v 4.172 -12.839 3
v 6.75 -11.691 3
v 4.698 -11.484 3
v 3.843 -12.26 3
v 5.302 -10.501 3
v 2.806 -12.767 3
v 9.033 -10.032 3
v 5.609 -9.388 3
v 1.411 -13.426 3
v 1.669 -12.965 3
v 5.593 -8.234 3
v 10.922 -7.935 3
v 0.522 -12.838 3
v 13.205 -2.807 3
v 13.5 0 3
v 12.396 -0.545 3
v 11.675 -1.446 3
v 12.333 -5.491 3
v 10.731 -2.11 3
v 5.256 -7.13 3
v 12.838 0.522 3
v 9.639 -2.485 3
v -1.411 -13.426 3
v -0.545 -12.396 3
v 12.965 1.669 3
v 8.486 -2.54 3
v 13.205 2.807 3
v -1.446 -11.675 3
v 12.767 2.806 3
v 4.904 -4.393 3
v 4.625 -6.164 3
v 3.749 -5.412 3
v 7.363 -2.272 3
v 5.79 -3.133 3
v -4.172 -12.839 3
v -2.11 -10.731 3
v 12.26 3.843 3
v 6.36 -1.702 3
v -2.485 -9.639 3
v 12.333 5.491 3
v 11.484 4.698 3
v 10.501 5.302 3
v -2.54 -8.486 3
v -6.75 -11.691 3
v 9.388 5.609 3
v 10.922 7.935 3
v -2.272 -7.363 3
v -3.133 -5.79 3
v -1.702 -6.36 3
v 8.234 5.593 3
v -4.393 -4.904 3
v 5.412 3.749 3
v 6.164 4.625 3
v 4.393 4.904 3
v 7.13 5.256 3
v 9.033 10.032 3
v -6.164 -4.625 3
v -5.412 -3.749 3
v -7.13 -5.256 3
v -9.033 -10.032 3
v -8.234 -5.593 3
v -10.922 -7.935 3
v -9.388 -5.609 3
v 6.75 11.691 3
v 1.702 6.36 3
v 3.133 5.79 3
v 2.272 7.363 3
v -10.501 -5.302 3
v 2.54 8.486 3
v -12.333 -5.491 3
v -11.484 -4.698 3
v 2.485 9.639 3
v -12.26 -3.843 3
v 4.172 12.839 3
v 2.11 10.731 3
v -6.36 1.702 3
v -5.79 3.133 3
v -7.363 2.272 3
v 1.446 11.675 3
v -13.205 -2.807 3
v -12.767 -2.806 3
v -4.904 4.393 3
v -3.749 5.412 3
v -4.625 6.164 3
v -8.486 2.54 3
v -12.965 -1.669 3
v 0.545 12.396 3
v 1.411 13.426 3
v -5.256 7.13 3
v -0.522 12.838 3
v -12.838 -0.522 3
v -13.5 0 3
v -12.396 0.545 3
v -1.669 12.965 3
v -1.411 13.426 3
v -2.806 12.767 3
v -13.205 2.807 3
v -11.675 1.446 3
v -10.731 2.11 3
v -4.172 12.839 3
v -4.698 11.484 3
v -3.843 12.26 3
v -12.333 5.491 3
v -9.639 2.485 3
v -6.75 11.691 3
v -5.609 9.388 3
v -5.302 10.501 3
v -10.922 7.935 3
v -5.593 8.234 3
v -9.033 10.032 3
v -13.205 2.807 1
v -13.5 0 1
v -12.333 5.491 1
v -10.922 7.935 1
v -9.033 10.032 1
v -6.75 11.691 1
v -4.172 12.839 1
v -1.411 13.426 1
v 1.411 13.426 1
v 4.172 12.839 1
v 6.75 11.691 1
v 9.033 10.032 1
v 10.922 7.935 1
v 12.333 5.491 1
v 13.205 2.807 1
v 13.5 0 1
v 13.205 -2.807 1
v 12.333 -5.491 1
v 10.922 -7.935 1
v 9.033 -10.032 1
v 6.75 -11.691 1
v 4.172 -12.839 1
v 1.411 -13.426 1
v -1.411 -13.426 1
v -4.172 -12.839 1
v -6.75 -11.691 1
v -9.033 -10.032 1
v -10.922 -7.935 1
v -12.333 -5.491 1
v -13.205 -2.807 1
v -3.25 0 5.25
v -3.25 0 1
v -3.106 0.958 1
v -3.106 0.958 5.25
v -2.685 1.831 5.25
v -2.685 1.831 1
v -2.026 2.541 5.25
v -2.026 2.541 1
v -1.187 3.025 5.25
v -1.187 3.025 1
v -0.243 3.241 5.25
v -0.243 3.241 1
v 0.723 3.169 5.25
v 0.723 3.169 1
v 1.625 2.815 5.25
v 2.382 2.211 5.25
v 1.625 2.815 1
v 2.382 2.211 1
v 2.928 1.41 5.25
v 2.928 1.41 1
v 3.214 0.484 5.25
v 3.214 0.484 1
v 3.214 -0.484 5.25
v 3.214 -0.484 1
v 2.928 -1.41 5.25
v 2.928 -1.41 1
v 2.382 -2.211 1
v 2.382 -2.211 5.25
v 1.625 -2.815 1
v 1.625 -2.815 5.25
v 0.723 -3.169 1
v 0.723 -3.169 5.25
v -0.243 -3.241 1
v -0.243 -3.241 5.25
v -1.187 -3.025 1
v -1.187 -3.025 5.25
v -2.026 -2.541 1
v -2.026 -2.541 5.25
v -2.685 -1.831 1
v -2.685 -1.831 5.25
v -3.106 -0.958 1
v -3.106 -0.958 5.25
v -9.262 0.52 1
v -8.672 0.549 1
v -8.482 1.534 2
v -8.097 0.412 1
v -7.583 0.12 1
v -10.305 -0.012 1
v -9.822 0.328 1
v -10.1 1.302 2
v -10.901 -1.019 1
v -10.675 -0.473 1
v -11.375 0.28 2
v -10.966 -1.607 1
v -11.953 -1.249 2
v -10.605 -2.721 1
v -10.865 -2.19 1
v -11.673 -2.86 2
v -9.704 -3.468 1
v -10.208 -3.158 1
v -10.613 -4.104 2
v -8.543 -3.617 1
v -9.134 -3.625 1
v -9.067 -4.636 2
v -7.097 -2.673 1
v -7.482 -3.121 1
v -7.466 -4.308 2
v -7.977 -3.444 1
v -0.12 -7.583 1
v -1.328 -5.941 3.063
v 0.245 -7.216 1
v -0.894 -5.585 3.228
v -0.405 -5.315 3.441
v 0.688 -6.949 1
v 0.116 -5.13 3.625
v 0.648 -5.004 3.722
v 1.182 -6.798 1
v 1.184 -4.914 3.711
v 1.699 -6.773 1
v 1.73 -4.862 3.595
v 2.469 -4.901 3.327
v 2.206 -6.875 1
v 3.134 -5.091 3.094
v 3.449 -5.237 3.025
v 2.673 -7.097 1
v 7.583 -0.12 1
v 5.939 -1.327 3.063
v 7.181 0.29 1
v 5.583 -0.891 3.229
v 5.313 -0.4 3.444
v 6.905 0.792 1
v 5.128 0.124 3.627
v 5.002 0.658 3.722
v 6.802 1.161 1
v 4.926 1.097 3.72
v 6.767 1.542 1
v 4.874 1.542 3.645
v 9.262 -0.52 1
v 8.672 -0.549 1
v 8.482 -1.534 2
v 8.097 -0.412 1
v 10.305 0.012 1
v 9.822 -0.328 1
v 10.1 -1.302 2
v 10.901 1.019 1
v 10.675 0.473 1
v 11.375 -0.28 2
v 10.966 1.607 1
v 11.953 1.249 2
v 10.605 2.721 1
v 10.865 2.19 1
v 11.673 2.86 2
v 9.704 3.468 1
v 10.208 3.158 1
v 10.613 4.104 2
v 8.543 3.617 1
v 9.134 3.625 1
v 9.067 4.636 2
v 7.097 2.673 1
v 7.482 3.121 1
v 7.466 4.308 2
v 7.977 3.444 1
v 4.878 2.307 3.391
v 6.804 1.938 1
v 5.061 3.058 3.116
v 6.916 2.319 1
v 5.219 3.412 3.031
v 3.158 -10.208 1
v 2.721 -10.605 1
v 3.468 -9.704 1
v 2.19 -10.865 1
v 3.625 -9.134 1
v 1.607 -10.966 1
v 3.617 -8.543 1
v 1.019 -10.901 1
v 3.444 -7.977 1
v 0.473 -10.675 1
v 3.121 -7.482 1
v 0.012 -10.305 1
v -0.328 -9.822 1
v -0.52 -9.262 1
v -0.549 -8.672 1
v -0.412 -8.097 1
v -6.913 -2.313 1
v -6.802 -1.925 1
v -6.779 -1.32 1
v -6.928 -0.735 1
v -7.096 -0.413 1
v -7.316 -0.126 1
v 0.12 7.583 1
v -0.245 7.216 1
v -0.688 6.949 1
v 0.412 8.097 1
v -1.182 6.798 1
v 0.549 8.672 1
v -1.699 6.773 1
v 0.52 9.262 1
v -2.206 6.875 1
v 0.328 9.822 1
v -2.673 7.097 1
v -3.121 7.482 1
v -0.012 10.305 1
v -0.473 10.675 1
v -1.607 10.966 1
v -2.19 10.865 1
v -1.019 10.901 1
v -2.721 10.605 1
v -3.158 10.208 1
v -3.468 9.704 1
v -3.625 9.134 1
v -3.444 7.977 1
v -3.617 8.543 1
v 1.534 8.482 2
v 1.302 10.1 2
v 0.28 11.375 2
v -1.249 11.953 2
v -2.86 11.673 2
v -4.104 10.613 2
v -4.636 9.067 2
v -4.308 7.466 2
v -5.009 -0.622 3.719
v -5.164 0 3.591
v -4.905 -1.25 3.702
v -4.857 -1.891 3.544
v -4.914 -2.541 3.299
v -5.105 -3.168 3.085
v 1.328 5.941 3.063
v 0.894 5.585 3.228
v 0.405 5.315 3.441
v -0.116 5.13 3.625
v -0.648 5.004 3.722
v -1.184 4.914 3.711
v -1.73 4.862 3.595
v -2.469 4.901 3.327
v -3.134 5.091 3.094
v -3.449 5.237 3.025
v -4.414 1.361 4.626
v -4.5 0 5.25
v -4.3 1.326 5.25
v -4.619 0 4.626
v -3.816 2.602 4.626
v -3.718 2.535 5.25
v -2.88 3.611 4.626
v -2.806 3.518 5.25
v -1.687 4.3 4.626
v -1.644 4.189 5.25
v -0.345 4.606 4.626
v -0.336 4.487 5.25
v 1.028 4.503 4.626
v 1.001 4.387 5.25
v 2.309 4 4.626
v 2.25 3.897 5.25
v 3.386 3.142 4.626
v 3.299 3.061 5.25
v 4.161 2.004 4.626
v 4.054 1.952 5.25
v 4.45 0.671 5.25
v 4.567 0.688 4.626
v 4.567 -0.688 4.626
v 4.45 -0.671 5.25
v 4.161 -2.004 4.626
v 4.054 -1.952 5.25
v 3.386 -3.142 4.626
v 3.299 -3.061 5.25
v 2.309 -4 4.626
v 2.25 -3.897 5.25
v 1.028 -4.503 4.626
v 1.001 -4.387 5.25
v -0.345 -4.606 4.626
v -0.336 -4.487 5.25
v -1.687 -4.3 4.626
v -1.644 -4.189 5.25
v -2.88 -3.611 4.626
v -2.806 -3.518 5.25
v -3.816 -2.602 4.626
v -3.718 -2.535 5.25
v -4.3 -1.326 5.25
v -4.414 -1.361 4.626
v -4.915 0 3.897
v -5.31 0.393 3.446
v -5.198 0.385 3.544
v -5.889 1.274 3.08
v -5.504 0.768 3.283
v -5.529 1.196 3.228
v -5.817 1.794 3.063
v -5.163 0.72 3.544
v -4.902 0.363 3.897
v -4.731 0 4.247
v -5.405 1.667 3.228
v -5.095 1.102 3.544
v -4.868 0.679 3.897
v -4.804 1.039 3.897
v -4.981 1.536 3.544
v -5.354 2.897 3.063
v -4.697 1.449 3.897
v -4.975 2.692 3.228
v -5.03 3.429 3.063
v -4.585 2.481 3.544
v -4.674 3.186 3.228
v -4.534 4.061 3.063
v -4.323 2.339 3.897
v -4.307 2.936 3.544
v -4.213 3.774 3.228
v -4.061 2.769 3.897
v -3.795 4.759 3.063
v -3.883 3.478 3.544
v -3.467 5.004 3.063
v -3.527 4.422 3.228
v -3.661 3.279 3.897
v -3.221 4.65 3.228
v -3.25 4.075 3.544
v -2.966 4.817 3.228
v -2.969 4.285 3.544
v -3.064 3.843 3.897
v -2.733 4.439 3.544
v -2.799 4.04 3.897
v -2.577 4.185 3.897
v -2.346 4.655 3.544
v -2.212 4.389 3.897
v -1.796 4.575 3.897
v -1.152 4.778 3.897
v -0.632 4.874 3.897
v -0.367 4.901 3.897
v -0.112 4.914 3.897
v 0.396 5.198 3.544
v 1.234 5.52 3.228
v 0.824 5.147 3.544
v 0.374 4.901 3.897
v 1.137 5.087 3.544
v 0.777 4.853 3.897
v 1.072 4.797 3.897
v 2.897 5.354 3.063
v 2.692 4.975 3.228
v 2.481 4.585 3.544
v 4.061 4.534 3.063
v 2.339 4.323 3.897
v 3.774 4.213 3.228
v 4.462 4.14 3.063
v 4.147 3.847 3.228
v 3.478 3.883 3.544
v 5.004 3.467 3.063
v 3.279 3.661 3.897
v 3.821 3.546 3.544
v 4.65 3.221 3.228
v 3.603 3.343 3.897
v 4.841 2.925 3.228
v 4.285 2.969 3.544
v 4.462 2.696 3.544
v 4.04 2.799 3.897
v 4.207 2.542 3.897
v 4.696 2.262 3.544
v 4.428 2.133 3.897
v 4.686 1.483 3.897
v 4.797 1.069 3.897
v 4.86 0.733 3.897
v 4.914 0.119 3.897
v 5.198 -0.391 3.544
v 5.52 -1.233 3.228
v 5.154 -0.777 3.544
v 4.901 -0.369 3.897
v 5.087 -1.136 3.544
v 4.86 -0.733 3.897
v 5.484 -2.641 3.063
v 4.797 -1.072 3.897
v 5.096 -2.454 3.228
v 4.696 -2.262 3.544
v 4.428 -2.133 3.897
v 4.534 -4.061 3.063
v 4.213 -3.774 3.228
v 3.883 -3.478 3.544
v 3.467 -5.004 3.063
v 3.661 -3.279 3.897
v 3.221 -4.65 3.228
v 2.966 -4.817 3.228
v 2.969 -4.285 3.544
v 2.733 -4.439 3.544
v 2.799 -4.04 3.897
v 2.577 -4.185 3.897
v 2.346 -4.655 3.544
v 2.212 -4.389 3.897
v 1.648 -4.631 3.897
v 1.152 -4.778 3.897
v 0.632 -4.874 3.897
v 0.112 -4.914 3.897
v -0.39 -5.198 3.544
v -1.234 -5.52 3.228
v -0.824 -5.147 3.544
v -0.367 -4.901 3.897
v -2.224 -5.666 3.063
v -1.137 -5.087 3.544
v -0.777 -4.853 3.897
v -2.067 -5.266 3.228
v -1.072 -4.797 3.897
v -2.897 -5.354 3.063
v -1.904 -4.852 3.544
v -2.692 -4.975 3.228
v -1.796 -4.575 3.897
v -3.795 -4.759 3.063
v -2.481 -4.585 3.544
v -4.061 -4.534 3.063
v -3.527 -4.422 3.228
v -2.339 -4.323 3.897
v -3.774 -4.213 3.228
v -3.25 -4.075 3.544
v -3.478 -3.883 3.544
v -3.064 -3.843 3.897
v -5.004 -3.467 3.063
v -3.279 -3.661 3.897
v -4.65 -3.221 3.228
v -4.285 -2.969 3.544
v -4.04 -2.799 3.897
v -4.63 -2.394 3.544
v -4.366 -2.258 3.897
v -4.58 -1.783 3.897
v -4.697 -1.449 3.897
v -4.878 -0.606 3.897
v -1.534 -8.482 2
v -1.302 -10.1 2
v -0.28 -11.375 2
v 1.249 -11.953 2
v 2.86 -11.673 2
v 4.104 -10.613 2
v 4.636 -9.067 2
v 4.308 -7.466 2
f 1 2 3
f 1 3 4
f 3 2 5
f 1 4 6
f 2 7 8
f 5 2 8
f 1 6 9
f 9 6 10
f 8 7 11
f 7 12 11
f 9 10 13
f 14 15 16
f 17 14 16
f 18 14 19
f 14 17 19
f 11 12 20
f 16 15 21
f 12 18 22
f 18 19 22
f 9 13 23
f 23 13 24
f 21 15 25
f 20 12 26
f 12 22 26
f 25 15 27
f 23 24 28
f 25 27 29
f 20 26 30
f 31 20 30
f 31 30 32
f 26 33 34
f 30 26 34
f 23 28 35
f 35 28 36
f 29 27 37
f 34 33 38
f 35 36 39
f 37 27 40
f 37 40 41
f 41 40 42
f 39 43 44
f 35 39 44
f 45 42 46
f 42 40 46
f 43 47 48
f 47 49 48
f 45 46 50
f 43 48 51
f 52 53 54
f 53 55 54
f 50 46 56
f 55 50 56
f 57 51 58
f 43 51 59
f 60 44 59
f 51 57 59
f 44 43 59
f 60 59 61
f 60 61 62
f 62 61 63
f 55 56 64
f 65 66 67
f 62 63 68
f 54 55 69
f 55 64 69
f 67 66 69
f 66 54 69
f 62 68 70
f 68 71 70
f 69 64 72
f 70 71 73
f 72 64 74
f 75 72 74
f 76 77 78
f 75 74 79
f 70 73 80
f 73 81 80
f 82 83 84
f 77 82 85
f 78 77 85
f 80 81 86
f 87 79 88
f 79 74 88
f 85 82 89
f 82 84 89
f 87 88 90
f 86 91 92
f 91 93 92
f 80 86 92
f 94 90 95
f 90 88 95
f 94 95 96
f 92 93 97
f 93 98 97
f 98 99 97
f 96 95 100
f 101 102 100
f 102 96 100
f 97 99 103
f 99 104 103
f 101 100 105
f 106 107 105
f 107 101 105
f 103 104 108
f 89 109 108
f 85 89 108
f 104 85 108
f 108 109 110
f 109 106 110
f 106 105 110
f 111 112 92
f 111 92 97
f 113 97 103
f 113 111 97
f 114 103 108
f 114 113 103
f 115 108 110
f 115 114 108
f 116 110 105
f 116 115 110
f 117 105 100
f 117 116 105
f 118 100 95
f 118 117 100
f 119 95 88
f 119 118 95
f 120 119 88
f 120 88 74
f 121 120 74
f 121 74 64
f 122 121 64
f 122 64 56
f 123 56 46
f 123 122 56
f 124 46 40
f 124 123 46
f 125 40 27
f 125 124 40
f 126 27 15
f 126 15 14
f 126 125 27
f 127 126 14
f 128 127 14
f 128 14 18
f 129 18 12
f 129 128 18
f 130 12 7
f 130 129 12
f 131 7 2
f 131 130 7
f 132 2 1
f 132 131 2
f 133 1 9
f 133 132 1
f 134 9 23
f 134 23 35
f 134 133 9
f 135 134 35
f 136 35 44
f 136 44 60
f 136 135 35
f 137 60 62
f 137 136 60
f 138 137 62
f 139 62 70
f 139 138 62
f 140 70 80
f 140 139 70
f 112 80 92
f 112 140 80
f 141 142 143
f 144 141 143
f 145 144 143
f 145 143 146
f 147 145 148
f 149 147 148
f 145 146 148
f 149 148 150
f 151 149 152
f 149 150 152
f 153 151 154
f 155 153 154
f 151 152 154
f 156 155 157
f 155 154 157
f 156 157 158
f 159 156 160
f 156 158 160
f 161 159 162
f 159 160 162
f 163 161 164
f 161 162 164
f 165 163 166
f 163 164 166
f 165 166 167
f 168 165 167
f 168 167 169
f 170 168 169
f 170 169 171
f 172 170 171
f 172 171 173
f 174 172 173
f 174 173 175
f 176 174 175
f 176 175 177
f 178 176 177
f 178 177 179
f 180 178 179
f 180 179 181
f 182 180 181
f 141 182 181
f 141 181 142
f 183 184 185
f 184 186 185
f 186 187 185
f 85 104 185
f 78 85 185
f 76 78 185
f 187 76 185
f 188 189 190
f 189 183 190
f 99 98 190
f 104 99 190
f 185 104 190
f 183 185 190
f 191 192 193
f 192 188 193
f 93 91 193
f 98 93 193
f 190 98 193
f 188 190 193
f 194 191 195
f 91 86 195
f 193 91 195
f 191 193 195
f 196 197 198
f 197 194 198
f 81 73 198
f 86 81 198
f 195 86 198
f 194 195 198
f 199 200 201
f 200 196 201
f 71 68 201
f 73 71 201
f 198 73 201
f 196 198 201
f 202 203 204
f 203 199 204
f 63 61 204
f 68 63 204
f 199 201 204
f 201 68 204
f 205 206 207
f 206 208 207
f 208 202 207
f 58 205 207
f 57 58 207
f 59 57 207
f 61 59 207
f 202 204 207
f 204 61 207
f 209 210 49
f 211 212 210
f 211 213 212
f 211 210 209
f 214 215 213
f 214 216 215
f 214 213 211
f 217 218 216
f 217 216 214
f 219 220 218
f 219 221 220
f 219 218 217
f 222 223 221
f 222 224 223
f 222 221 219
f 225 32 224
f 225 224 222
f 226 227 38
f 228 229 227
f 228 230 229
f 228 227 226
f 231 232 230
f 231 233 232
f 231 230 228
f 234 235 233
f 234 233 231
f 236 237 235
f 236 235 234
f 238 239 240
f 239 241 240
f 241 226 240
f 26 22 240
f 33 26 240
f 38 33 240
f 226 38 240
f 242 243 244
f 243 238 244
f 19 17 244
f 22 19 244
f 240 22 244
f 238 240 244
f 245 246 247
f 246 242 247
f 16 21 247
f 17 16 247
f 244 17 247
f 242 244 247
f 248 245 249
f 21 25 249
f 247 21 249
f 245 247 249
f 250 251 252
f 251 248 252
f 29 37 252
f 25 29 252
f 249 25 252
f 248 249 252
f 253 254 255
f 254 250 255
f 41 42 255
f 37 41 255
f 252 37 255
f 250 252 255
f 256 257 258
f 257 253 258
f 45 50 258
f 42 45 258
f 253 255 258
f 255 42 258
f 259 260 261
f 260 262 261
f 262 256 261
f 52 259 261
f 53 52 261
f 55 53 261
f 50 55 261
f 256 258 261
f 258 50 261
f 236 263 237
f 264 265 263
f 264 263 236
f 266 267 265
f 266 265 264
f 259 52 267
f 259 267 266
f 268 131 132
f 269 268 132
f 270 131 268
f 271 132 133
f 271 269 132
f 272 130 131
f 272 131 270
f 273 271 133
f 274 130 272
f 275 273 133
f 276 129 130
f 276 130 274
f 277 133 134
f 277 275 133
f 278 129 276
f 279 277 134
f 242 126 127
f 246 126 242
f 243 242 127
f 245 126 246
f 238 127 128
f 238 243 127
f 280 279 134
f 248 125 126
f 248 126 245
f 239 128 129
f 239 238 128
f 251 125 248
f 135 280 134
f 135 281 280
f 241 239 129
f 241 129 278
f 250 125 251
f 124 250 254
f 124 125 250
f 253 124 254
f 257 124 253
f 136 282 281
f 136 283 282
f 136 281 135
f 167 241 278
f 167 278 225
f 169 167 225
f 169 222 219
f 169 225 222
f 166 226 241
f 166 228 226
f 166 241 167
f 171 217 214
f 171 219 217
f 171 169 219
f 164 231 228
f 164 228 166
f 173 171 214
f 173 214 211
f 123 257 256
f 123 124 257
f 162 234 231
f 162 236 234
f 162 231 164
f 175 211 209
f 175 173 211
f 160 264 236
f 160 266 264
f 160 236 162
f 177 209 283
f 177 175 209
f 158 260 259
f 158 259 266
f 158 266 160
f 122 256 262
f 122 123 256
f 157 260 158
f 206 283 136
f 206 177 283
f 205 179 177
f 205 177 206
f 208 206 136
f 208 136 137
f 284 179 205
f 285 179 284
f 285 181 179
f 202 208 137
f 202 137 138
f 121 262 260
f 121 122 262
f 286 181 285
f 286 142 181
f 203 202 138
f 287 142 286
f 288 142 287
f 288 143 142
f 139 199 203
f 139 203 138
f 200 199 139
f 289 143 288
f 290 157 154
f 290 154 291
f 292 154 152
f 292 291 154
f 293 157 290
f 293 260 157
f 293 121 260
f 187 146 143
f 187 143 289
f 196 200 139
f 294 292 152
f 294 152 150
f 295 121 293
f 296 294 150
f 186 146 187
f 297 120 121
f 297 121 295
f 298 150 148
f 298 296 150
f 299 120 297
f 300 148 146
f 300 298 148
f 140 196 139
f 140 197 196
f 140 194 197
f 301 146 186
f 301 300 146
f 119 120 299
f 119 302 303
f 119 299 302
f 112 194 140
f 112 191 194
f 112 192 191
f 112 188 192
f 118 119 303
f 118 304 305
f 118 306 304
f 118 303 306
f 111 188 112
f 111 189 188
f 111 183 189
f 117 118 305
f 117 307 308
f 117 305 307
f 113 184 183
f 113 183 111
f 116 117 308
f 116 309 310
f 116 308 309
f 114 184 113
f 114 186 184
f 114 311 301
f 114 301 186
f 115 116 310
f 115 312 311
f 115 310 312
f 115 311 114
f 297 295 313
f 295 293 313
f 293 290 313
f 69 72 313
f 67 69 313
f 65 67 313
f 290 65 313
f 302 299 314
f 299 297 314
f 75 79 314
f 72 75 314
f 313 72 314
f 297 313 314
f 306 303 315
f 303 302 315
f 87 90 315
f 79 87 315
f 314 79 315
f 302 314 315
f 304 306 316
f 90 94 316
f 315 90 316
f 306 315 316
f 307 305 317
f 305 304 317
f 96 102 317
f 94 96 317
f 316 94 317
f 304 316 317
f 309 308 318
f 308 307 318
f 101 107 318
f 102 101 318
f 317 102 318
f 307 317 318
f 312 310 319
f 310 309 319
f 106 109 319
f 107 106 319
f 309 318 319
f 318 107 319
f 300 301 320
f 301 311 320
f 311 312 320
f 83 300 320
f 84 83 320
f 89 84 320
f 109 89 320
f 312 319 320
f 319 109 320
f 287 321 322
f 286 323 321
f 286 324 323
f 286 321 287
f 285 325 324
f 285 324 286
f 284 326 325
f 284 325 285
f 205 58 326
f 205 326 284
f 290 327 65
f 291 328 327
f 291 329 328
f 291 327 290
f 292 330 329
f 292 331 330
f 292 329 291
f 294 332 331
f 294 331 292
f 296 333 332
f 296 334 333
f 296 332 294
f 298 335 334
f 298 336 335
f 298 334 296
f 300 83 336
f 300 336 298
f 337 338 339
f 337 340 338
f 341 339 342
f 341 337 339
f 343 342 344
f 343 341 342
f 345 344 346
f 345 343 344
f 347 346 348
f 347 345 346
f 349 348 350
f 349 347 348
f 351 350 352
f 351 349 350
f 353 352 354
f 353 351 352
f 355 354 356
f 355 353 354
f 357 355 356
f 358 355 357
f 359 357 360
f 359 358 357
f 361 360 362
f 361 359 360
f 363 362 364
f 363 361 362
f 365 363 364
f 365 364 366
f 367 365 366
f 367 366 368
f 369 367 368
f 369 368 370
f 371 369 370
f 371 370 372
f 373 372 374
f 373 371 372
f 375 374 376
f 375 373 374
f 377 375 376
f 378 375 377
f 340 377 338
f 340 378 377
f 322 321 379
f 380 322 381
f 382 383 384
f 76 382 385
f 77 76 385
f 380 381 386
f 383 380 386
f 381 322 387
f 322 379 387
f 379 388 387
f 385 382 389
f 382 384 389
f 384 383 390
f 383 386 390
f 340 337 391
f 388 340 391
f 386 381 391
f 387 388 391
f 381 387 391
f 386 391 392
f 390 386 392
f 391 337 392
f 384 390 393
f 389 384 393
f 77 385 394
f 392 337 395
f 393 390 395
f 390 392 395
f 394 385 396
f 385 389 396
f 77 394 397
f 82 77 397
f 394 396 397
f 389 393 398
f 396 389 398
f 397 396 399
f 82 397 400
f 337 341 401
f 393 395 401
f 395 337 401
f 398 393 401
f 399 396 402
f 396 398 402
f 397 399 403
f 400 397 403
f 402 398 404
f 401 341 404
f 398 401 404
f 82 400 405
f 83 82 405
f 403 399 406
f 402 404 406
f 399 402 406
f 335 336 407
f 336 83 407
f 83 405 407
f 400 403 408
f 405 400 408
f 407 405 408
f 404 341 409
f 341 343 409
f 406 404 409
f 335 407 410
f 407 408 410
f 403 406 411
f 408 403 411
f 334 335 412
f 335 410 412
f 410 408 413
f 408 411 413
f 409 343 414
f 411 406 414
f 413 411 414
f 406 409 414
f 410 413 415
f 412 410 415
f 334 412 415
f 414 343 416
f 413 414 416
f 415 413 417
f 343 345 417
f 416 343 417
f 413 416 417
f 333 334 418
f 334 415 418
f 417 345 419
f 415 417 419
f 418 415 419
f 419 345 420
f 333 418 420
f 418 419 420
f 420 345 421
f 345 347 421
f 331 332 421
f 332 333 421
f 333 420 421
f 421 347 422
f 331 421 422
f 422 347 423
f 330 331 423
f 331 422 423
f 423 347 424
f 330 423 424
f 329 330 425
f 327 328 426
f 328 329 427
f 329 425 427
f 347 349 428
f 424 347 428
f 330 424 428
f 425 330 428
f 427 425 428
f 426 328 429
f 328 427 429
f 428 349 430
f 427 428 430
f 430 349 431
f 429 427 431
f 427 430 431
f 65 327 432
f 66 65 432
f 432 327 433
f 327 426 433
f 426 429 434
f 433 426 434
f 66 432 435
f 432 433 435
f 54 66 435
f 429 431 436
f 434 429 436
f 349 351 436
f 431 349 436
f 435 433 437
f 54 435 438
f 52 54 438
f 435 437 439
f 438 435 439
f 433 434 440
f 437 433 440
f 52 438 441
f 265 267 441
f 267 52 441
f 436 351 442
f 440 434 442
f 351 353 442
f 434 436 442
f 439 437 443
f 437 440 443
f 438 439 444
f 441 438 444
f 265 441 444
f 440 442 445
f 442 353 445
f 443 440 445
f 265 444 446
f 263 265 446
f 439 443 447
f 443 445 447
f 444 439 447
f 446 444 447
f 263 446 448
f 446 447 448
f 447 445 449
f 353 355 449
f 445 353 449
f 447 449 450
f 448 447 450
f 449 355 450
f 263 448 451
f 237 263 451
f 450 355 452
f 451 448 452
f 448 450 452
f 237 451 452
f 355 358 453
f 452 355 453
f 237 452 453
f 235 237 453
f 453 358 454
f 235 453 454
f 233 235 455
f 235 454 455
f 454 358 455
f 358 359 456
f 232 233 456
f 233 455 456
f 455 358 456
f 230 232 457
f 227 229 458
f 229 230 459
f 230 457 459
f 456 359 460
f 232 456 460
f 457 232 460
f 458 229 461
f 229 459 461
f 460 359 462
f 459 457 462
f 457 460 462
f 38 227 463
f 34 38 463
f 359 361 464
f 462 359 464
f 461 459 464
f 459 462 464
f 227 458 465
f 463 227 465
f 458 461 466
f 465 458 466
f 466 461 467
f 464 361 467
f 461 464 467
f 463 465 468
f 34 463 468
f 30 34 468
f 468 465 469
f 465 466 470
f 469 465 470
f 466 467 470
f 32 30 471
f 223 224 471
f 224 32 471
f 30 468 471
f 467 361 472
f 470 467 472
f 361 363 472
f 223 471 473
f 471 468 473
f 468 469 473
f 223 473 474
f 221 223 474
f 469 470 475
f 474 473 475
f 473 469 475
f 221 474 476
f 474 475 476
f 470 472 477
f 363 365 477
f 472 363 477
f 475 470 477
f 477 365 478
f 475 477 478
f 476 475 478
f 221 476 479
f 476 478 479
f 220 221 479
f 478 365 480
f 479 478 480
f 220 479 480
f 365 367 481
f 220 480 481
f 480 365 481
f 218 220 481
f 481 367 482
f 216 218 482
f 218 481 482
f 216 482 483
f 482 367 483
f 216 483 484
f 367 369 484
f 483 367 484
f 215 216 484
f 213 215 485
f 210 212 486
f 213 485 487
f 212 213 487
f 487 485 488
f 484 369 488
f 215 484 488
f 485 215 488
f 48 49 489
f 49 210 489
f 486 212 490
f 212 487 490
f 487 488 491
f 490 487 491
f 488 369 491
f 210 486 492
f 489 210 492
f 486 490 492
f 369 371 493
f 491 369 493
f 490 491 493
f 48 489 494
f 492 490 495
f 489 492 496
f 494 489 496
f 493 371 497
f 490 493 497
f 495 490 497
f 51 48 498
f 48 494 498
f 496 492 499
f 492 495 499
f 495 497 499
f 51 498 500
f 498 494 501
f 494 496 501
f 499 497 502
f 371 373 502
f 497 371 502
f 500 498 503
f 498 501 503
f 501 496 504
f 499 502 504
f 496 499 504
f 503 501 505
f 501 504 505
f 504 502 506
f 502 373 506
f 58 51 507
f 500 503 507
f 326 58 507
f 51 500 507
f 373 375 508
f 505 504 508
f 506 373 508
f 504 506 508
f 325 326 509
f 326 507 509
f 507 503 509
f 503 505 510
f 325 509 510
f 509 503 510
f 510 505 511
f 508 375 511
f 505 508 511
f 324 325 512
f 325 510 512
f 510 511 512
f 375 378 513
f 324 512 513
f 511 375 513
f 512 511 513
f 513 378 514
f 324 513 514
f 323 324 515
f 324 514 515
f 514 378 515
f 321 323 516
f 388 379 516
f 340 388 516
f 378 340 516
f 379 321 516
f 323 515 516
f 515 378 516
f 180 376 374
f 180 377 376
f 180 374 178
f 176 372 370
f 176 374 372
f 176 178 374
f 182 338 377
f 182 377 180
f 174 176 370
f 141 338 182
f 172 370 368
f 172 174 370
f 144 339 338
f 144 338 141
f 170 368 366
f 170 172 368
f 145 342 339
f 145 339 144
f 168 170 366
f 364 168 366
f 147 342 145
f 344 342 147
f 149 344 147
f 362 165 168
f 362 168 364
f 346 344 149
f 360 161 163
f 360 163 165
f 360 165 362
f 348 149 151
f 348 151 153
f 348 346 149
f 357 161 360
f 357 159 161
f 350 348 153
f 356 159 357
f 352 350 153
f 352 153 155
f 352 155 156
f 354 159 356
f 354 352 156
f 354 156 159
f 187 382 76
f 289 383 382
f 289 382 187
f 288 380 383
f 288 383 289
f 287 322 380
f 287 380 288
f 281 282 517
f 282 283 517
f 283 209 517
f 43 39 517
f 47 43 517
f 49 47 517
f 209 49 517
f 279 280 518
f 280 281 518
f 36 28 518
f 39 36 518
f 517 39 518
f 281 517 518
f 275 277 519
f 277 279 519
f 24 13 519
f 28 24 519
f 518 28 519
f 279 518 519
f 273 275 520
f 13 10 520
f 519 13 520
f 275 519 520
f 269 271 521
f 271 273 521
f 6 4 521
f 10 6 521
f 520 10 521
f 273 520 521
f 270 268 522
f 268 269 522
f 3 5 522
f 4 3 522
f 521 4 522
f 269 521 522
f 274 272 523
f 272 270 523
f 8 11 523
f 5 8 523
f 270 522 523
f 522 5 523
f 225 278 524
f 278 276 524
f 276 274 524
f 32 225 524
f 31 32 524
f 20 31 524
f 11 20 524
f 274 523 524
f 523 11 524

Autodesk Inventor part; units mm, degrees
ref_plane "YZ Plane" through (0, 0, 0) normal (1, 0, 0) x (0, 1, 0)
ref_plane "XZ Plane" through (0, 0, 0) normal (0, 1, 0) x (-1, 0, 0)
ref_plane "XY Plane" through (0, 0, 0) normal (0, 0, 1) x (1, 0, 0)
sketch "Эскиз1" plane through (0, 0, 0) normal (0, 0, 1) x (1, 0, 0)
  circle A0 centre (0, 0) radius 3.25
  circle A1 centre (0, 0) radius 4.5
  dimension "d0" = 6.5
  dimension "d1" = 9
extrude "Выдавливание1" add sketch "Эскиз1" along normal blind 5.25
sketch "Эскиз2" plane through (0, 0, 0) normal (0, 0, -1) x (-1, 0, 0)
  circle A0 centre (0, 0) radius 5.5
  dimension "d4" = 11
loft "Лофт1" add profiles "Эскиз2" section 2 edges at (-4.5, 0, 5.25)
sketch "Эскиз4" plane through (0, 0, 0) normal (0, 0, -1) x (-1, 0, 0)
  circle A0 centre (0, 0) radius 3.25
  dimension "d10" = 6.5
extrude "Выдавливание2" cut sketch "Эскиз4" against normal through all
sketch "Эскиз5" plane through (0, 0, 0) normal (0, 0, -1) x (-1, 0, 0)
  circle A0 centre (-8.8669, 1.5421) radius 2.1 projected
  circle A1 centre (-1.5421, -8.8669) radius 2.1 projected
  circle A2 centre (1.5421, 8.8669) radius 2.1 projected
  circle A3 centre (8.8669, -1.5421) radius 2.1 projected
  circle A4 centre (0, 0) radius 13.5
  circle A5 centre (0, 0) radius 3.25 projected
  dimension "d13" = 27
extrude "Выдавливание3" add sketch "Эскиз5" against normal blind 3
fillet "Сопряжение1" radius 2 1 edges at (4.9286, 0, 3)
chamfer "Фаска1" distance 2 angle 45 4 edges at (0.5579, 8.8669, 3) (10.9669, 1.5421, 3) (-6.7669, -1.5421, 3) (3.6421, -8.8669, 3)
sketch "Эскиз6" plane through (0, 0, 0) normal (0, 0, -1) x (-1, 0, 0)
  circle A0 centre (0, 0) radius 13.5 projected
  circle A1 centre (8.8669, -1.5421) radius 2.1 projected
  circle A2 centre (1.5421, 8.8669) radius 2.1 projected
  circle A3 centre (-1.5421, -8.8669) radius 2.1 projected
  circle A4 centre (-8.8669, 1.5421) radius 2.1 projected
  circle A5 centre (0, 0) radius 3.25 projected
extrude "Выдавливание4" cut sketch "Эскиз6" against normal blind 1
properties part number "втулка для крепл 2" material "Пластик ПЭТ"
